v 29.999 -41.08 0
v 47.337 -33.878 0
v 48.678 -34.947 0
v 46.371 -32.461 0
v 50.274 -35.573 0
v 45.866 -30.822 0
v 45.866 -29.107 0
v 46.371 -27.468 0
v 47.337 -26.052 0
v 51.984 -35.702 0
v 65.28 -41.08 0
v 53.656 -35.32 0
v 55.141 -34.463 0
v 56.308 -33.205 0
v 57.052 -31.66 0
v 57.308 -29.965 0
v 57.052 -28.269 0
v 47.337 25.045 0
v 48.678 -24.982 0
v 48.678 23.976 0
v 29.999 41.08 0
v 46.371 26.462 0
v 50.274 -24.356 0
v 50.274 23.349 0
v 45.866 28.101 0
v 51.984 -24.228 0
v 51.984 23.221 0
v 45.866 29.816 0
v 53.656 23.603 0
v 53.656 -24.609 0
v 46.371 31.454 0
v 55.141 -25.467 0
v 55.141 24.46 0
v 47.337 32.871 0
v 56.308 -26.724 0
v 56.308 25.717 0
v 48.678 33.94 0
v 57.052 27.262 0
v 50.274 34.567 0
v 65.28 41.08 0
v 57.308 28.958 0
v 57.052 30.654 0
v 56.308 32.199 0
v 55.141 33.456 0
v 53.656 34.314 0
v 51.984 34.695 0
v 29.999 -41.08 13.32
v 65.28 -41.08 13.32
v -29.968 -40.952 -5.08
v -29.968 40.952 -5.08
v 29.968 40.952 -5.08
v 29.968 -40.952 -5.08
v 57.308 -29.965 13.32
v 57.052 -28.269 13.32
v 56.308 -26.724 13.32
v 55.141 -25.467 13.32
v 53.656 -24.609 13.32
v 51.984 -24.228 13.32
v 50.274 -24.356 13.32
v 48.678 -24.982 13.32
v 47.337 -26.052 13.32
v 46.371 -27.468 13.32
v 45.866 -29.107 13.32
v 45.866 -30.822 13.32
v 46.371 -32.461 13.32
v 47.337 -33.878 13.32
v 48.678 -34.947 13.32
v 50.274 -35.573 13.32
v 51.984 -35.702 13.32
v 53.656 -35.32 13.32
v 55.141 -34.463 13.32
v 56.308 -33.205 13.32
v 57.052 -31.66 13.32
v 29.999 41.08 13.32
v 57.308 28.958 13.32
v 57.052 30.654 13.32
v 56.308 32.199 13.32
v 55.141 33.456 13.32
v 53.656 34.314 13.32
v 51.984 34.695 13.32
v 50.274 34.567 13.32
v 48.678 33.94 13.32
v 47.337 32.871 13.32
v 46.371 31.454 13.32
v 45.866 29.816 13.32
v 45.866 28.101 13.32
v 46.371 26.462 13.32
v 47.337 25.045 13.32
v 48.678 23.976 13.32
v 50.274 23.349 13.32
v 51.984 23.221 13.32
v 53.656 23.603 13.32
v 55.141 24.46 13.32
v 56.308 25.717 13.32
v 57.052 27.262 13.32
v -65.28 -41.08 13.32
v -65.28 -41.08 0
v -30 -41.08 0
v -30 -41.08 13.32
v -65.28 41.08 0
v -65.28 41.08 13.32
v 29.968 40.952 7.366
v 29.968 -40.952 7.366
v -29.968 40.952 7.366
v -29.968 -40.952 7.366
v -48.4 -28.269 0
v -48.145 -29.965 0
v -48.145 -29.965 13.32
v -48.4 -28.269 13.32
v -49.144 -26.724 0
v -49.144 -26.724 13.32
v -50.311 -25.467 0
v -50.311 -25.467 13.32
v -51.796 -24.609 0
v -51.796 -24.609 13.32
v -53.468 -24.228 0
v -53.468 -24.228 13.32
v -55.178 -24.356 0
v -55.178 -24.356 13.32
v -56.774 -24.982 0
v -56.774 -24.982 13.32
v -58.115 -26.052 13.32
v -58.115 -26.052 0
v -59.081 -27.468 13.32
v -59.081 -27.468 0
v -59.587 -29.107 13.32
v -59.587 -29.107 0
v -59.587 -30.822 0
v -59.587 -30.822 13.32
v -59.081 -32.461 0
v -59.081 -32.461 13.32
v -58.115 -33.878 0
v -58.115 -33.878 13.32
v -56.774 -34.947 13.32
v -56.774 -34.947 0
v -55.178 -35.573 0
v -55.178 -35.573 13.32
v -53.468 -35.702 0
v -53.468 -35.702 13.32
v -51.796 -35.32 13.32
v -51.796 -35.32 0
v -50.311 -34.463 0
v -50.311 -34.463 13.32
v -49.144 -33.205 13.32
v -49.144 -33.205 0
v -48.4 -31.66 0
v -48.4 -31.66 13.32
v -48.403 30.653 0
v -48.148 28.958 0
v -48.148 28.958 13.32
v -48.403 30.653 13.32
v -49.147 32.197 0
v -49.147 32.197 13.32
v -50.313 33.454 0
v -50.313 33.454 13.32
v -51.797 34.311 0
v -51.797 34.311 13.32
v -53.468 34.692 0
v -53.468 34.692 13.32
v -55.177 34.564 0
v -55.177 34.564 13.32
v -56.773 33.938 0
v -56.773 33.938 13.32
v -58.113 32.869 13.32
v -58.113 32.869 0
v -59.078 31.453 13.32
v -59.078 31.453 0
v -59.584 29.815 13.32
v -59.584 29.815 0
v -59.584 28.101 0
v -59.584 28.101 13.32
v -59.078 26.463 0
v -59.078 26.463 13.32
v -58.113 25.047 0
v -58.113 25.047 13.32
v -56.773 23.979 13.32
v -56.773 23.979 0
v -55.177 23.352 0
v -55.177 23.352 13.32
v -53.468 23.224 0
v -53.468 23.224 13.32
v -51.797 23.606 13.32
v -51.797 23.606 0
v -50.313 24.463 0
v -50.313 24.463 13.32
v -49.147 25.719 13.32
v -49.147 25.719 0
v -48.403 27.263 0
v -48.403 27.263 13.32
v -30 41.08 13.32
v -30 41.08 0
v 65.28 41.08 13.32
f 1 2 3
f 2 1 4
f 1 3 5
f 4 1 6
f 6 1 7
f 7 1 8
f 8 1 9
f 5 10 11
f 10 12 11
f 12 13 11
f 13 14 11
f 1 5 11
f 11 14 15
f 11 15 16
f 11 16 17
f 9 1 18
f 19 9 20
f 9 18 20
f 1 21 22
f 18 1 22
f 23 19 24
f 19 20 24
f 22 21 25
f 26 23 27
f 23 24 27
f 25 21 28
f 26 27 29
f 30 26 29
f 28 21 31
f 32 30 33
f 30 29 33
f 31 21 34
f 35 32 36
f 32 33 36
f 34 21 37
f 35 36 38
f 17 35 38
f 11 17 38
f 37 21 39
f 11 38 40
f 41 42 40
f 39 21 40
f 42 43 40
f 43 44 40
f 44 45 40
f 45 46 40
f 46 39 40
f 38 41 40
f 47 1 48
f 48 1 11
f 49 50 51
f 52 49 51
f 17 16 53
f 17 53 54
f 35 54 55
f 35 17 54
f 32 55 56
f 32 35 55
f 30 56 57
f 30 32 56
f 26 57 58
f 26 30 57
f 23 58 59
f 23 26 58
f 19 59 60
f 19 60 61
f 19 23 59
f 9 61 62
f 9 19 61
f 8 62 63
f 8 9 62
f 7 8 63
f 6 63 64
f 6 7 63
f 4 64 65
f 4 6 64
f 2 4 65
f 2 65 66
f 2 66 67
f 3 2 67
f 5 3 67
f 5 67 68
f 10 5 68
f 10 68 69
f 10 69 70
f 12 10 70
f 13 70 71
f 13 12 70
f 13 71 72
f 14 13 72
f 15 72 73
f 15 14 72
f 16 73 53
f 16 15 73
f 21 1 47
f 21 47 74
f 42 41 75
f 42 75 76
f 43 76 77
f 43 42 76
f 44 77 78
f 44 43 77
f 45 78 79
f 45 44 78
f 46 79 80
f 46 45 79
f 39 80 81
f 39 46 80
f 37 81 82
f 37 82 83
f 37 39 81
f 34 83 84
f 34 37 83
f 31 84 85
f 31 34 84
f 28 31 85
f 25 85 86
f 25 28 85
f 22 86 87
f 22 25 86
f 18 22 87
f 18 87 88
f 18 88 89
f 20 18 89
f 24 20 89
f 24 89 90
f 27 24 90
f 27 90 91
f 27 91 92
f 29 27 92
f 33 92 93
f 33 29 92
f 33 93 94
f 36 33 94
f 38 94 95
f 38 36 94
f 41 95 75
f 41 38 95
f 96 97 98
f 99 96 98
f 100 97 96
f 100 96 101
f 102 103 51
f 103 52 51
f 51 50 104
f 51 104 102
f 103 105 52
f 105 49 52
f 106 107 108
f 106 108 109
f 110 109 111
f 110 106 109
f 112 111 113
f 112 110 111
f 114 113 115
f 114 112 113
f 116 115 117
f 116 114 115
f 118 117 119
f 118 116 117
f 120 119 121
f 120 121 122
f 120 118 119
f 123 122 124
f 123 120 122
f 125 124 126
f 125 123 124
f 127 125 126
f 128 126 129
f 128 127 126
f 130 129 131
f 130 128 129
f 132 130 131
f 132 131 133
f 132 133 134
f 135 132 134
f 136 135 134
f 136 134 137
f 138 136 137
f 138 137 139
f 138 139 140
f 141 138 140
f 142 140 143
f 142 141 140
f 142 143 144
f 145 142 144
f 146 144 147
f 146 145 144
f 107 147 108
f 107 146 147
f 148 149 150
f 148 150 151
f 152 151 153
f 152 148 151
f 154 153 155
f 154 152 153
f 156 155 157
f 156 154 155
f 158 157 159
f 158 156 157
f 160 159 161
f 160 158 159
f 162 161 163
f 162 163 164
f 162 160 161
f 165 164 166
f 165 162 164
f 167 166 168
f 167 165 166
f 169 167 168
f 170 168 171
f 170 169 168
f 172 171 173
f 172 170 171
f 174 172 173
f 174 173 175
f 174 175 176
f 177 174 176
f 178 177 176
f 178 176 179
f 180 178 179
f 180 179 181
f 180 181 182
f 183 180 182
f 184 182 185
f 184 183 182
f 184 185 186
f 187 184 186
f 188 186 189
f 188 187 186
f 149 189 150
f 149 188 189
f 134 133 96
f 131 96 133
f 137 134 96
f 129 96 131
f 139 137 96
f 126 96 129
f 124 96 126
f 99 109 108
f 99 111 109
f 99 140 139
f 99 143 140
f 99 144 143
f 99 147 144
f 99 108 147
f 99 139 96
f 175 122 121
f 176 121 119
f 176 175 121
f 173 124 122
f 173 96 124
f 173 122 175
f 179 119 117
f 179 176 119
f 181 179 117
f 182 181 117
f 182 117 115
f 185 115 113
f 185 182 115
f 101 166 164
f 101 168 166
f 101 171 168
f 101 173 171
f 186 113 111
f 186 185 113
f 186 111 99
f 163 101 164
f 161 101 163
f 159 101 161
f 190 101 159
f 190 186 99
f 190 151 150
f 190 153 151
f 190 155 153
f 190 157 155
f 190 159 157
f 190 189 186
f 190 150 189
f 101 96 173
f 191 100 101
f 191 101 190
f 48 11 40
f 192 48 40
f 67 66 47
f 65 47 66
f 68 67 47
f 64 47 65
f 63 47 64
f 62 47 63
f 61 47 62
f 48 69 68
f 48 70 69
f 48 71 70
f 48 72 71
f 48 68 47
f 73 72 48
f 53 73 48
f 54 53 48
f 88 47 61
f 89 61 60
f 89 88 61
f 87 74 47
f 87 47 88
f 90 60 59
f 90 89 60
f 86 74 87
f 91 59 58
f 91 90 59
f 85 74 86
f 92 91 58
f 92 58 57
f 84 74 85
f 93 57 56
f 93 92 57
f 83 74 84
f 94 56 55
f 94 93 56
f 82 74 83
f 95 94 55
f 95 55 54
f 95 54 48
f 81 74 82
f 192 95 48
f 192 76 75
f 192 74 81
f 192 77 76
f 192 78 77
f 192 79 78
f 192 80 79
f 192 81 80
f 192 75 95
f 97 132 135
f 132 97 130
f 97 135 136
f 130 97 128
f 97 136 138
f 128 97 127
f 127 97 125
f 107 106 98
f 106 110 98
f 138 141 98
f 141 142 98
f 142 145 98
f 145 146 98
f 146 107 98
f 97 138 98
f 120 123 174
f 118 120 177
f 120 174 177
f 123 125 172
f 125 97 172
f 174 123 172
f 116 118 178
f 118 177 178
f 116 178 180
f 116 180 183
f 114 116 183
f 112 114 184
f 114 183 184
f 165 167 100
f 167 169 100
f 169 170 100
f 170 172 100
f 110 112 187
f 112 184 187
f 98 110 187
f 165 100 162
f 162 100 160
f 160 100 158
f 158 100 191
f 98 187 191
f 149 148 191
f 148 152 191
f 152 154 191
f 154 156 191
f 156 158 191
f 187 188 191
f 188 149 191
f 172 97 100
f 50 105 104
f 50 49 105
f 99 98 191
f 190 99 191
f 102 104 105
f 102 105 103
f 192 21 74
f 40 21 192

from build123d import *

# Parameters (mm, degrees)
F0_W     = 35.280001
F0_H     = 82.16
F0_R     = 5.7531
F0_R_2   = 5.75
F0_W_2   = 35.2806
F1_DEPTH = 13.32
F2_W     = 59.93694
F2_H     = 81.903108
F3_DEPTH = 5.08
F4_W     = 59.93694
F4_H     = 81.903108
F5_DEPTH = 7.366


with BuildPart() as f1:
    # F0 (on Top) → F1 (new body)
    with BuildSketch(Plane.XY):
        with Locations((-47.639923, 0)):
            Rectangle(F0_W, F0_H)
        with Locations((-53.89778, -29.964609)):
            Circle(F0_R, mode=Mode.SUBTRACT)
        with Locations((-53.89778, 28.958148)):
            Circle(F0_R_2, mode=Mode.SUBTRACT)
        with Locations((47.639624, 0)):
            Rectangle(F0_W_2, F0_H)
        with Locations((51.5544, -29.964609)):
            Circle(F0_R, mode=Mode.SUBTRACT)
        with Locations((51.5544, 28.958148)):
            Circle(F0_R, mode=Mode.SUBTRACT)
    extrude(amount=F1_DEPTH)


with BuildPart() as f3:
    # F2 (on Top) → F3 (new body)
    with BuildSketch(Plane.XY):
        Rectangle(F2_W, F2_H)
    extrude(amount=-F3_DEPTH)

    # F4 (on face) → F5 (join)
    with BuildSketch(Plane.XY):
        Rectangle(F4_W, F4_H)
    extrude(amount=F5_DEPTH)


solid = Compound([f1.part, f3.part])
